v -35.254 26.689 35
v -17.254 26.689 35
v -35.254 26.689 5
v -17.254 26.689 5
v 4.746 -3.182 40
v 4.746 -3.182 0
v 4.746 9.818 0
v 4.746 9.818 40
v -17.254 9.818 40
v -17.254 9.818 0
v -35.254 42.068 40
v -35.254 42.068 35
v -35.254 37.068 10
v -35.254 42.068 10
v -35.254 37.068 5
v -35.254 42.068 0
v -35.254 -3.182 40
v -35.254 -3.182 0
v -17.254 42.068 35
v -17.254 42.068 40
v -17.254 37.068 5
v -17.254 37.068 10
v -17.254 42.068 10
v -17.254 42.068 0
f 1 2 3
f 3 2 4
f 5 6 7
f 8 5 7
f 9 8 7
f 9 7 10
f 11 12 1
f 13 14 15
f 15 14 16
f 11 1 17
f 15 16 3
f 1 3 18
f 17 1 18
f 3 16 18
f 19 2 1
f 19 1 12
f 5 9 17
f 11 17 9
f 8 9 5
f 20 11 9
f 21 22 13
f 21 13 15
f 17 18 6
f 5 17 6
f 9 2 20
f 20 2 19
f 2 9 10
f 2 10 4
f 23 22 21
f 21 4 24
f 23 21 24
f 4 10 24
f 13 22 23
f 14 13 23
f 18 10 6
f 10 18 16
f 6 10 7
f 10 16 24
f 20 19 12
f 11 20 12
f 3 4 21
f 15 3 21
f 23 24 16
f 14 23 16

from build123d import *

# Parameters (mm, degrees)
BOSS_EXTRUDE1_DEPTH = 40
SKETCH2_W           = 25
SKETCH2_H           = 5
CUT_EXTRUDE1_DEPTH  = 40
SKETCH3_W           = 30
SKETCH3_H           = 10.379013983
CUT_EXTRUDE2_DEPTH  = 40


with BuildPart() as part:
    # Sketch1 → Boss-Extrude1 (new body)
    with BuildSketch(Plane.XY):
        Polygon((-17.254373504, 42.068083371), (-35.254373504, 42.068083371), (-35.254373504, -3.181916629), (4.745626496, -3.181916629), (4.745626496, 9.818083371), (-17.254373504, 9.818083371), align=None)
    extrude(amount=BOSS_EXTRUDE1_DEPTH)

    # Sketch2 → Cut-Extrude1 (cut)
    with BuildSketch(Plane(origin=(-17.254373504, 0, 0), x_dir=(0, 0, -1), z_dir=(1, 0, 0))):
        with Locations((-22.5, 39.568083371)):
            Rectangle(SKETCH2_W, SKETCH2_H)
    extrude(amount=-CUT_EXTRUDE1_DEPTH, mode=Mode.SUBTRACT)

    # Sketch3 → Cut-Extrude2 (cut)
    with BuildSketch(Plane(origin=(-17.254373504, 0, 0), x_dir=(0, 0, -1), z_dir=(1, 0, 0))):
        with Locations((-20, 31.87857638)):
            Rectangle(SKETCH3_W, SKETCH3_H)
    extrude(amount=-CUT_EXTRUDE2_DEPTH, mode=Mode.SUBTRACT)


solid = part.part
